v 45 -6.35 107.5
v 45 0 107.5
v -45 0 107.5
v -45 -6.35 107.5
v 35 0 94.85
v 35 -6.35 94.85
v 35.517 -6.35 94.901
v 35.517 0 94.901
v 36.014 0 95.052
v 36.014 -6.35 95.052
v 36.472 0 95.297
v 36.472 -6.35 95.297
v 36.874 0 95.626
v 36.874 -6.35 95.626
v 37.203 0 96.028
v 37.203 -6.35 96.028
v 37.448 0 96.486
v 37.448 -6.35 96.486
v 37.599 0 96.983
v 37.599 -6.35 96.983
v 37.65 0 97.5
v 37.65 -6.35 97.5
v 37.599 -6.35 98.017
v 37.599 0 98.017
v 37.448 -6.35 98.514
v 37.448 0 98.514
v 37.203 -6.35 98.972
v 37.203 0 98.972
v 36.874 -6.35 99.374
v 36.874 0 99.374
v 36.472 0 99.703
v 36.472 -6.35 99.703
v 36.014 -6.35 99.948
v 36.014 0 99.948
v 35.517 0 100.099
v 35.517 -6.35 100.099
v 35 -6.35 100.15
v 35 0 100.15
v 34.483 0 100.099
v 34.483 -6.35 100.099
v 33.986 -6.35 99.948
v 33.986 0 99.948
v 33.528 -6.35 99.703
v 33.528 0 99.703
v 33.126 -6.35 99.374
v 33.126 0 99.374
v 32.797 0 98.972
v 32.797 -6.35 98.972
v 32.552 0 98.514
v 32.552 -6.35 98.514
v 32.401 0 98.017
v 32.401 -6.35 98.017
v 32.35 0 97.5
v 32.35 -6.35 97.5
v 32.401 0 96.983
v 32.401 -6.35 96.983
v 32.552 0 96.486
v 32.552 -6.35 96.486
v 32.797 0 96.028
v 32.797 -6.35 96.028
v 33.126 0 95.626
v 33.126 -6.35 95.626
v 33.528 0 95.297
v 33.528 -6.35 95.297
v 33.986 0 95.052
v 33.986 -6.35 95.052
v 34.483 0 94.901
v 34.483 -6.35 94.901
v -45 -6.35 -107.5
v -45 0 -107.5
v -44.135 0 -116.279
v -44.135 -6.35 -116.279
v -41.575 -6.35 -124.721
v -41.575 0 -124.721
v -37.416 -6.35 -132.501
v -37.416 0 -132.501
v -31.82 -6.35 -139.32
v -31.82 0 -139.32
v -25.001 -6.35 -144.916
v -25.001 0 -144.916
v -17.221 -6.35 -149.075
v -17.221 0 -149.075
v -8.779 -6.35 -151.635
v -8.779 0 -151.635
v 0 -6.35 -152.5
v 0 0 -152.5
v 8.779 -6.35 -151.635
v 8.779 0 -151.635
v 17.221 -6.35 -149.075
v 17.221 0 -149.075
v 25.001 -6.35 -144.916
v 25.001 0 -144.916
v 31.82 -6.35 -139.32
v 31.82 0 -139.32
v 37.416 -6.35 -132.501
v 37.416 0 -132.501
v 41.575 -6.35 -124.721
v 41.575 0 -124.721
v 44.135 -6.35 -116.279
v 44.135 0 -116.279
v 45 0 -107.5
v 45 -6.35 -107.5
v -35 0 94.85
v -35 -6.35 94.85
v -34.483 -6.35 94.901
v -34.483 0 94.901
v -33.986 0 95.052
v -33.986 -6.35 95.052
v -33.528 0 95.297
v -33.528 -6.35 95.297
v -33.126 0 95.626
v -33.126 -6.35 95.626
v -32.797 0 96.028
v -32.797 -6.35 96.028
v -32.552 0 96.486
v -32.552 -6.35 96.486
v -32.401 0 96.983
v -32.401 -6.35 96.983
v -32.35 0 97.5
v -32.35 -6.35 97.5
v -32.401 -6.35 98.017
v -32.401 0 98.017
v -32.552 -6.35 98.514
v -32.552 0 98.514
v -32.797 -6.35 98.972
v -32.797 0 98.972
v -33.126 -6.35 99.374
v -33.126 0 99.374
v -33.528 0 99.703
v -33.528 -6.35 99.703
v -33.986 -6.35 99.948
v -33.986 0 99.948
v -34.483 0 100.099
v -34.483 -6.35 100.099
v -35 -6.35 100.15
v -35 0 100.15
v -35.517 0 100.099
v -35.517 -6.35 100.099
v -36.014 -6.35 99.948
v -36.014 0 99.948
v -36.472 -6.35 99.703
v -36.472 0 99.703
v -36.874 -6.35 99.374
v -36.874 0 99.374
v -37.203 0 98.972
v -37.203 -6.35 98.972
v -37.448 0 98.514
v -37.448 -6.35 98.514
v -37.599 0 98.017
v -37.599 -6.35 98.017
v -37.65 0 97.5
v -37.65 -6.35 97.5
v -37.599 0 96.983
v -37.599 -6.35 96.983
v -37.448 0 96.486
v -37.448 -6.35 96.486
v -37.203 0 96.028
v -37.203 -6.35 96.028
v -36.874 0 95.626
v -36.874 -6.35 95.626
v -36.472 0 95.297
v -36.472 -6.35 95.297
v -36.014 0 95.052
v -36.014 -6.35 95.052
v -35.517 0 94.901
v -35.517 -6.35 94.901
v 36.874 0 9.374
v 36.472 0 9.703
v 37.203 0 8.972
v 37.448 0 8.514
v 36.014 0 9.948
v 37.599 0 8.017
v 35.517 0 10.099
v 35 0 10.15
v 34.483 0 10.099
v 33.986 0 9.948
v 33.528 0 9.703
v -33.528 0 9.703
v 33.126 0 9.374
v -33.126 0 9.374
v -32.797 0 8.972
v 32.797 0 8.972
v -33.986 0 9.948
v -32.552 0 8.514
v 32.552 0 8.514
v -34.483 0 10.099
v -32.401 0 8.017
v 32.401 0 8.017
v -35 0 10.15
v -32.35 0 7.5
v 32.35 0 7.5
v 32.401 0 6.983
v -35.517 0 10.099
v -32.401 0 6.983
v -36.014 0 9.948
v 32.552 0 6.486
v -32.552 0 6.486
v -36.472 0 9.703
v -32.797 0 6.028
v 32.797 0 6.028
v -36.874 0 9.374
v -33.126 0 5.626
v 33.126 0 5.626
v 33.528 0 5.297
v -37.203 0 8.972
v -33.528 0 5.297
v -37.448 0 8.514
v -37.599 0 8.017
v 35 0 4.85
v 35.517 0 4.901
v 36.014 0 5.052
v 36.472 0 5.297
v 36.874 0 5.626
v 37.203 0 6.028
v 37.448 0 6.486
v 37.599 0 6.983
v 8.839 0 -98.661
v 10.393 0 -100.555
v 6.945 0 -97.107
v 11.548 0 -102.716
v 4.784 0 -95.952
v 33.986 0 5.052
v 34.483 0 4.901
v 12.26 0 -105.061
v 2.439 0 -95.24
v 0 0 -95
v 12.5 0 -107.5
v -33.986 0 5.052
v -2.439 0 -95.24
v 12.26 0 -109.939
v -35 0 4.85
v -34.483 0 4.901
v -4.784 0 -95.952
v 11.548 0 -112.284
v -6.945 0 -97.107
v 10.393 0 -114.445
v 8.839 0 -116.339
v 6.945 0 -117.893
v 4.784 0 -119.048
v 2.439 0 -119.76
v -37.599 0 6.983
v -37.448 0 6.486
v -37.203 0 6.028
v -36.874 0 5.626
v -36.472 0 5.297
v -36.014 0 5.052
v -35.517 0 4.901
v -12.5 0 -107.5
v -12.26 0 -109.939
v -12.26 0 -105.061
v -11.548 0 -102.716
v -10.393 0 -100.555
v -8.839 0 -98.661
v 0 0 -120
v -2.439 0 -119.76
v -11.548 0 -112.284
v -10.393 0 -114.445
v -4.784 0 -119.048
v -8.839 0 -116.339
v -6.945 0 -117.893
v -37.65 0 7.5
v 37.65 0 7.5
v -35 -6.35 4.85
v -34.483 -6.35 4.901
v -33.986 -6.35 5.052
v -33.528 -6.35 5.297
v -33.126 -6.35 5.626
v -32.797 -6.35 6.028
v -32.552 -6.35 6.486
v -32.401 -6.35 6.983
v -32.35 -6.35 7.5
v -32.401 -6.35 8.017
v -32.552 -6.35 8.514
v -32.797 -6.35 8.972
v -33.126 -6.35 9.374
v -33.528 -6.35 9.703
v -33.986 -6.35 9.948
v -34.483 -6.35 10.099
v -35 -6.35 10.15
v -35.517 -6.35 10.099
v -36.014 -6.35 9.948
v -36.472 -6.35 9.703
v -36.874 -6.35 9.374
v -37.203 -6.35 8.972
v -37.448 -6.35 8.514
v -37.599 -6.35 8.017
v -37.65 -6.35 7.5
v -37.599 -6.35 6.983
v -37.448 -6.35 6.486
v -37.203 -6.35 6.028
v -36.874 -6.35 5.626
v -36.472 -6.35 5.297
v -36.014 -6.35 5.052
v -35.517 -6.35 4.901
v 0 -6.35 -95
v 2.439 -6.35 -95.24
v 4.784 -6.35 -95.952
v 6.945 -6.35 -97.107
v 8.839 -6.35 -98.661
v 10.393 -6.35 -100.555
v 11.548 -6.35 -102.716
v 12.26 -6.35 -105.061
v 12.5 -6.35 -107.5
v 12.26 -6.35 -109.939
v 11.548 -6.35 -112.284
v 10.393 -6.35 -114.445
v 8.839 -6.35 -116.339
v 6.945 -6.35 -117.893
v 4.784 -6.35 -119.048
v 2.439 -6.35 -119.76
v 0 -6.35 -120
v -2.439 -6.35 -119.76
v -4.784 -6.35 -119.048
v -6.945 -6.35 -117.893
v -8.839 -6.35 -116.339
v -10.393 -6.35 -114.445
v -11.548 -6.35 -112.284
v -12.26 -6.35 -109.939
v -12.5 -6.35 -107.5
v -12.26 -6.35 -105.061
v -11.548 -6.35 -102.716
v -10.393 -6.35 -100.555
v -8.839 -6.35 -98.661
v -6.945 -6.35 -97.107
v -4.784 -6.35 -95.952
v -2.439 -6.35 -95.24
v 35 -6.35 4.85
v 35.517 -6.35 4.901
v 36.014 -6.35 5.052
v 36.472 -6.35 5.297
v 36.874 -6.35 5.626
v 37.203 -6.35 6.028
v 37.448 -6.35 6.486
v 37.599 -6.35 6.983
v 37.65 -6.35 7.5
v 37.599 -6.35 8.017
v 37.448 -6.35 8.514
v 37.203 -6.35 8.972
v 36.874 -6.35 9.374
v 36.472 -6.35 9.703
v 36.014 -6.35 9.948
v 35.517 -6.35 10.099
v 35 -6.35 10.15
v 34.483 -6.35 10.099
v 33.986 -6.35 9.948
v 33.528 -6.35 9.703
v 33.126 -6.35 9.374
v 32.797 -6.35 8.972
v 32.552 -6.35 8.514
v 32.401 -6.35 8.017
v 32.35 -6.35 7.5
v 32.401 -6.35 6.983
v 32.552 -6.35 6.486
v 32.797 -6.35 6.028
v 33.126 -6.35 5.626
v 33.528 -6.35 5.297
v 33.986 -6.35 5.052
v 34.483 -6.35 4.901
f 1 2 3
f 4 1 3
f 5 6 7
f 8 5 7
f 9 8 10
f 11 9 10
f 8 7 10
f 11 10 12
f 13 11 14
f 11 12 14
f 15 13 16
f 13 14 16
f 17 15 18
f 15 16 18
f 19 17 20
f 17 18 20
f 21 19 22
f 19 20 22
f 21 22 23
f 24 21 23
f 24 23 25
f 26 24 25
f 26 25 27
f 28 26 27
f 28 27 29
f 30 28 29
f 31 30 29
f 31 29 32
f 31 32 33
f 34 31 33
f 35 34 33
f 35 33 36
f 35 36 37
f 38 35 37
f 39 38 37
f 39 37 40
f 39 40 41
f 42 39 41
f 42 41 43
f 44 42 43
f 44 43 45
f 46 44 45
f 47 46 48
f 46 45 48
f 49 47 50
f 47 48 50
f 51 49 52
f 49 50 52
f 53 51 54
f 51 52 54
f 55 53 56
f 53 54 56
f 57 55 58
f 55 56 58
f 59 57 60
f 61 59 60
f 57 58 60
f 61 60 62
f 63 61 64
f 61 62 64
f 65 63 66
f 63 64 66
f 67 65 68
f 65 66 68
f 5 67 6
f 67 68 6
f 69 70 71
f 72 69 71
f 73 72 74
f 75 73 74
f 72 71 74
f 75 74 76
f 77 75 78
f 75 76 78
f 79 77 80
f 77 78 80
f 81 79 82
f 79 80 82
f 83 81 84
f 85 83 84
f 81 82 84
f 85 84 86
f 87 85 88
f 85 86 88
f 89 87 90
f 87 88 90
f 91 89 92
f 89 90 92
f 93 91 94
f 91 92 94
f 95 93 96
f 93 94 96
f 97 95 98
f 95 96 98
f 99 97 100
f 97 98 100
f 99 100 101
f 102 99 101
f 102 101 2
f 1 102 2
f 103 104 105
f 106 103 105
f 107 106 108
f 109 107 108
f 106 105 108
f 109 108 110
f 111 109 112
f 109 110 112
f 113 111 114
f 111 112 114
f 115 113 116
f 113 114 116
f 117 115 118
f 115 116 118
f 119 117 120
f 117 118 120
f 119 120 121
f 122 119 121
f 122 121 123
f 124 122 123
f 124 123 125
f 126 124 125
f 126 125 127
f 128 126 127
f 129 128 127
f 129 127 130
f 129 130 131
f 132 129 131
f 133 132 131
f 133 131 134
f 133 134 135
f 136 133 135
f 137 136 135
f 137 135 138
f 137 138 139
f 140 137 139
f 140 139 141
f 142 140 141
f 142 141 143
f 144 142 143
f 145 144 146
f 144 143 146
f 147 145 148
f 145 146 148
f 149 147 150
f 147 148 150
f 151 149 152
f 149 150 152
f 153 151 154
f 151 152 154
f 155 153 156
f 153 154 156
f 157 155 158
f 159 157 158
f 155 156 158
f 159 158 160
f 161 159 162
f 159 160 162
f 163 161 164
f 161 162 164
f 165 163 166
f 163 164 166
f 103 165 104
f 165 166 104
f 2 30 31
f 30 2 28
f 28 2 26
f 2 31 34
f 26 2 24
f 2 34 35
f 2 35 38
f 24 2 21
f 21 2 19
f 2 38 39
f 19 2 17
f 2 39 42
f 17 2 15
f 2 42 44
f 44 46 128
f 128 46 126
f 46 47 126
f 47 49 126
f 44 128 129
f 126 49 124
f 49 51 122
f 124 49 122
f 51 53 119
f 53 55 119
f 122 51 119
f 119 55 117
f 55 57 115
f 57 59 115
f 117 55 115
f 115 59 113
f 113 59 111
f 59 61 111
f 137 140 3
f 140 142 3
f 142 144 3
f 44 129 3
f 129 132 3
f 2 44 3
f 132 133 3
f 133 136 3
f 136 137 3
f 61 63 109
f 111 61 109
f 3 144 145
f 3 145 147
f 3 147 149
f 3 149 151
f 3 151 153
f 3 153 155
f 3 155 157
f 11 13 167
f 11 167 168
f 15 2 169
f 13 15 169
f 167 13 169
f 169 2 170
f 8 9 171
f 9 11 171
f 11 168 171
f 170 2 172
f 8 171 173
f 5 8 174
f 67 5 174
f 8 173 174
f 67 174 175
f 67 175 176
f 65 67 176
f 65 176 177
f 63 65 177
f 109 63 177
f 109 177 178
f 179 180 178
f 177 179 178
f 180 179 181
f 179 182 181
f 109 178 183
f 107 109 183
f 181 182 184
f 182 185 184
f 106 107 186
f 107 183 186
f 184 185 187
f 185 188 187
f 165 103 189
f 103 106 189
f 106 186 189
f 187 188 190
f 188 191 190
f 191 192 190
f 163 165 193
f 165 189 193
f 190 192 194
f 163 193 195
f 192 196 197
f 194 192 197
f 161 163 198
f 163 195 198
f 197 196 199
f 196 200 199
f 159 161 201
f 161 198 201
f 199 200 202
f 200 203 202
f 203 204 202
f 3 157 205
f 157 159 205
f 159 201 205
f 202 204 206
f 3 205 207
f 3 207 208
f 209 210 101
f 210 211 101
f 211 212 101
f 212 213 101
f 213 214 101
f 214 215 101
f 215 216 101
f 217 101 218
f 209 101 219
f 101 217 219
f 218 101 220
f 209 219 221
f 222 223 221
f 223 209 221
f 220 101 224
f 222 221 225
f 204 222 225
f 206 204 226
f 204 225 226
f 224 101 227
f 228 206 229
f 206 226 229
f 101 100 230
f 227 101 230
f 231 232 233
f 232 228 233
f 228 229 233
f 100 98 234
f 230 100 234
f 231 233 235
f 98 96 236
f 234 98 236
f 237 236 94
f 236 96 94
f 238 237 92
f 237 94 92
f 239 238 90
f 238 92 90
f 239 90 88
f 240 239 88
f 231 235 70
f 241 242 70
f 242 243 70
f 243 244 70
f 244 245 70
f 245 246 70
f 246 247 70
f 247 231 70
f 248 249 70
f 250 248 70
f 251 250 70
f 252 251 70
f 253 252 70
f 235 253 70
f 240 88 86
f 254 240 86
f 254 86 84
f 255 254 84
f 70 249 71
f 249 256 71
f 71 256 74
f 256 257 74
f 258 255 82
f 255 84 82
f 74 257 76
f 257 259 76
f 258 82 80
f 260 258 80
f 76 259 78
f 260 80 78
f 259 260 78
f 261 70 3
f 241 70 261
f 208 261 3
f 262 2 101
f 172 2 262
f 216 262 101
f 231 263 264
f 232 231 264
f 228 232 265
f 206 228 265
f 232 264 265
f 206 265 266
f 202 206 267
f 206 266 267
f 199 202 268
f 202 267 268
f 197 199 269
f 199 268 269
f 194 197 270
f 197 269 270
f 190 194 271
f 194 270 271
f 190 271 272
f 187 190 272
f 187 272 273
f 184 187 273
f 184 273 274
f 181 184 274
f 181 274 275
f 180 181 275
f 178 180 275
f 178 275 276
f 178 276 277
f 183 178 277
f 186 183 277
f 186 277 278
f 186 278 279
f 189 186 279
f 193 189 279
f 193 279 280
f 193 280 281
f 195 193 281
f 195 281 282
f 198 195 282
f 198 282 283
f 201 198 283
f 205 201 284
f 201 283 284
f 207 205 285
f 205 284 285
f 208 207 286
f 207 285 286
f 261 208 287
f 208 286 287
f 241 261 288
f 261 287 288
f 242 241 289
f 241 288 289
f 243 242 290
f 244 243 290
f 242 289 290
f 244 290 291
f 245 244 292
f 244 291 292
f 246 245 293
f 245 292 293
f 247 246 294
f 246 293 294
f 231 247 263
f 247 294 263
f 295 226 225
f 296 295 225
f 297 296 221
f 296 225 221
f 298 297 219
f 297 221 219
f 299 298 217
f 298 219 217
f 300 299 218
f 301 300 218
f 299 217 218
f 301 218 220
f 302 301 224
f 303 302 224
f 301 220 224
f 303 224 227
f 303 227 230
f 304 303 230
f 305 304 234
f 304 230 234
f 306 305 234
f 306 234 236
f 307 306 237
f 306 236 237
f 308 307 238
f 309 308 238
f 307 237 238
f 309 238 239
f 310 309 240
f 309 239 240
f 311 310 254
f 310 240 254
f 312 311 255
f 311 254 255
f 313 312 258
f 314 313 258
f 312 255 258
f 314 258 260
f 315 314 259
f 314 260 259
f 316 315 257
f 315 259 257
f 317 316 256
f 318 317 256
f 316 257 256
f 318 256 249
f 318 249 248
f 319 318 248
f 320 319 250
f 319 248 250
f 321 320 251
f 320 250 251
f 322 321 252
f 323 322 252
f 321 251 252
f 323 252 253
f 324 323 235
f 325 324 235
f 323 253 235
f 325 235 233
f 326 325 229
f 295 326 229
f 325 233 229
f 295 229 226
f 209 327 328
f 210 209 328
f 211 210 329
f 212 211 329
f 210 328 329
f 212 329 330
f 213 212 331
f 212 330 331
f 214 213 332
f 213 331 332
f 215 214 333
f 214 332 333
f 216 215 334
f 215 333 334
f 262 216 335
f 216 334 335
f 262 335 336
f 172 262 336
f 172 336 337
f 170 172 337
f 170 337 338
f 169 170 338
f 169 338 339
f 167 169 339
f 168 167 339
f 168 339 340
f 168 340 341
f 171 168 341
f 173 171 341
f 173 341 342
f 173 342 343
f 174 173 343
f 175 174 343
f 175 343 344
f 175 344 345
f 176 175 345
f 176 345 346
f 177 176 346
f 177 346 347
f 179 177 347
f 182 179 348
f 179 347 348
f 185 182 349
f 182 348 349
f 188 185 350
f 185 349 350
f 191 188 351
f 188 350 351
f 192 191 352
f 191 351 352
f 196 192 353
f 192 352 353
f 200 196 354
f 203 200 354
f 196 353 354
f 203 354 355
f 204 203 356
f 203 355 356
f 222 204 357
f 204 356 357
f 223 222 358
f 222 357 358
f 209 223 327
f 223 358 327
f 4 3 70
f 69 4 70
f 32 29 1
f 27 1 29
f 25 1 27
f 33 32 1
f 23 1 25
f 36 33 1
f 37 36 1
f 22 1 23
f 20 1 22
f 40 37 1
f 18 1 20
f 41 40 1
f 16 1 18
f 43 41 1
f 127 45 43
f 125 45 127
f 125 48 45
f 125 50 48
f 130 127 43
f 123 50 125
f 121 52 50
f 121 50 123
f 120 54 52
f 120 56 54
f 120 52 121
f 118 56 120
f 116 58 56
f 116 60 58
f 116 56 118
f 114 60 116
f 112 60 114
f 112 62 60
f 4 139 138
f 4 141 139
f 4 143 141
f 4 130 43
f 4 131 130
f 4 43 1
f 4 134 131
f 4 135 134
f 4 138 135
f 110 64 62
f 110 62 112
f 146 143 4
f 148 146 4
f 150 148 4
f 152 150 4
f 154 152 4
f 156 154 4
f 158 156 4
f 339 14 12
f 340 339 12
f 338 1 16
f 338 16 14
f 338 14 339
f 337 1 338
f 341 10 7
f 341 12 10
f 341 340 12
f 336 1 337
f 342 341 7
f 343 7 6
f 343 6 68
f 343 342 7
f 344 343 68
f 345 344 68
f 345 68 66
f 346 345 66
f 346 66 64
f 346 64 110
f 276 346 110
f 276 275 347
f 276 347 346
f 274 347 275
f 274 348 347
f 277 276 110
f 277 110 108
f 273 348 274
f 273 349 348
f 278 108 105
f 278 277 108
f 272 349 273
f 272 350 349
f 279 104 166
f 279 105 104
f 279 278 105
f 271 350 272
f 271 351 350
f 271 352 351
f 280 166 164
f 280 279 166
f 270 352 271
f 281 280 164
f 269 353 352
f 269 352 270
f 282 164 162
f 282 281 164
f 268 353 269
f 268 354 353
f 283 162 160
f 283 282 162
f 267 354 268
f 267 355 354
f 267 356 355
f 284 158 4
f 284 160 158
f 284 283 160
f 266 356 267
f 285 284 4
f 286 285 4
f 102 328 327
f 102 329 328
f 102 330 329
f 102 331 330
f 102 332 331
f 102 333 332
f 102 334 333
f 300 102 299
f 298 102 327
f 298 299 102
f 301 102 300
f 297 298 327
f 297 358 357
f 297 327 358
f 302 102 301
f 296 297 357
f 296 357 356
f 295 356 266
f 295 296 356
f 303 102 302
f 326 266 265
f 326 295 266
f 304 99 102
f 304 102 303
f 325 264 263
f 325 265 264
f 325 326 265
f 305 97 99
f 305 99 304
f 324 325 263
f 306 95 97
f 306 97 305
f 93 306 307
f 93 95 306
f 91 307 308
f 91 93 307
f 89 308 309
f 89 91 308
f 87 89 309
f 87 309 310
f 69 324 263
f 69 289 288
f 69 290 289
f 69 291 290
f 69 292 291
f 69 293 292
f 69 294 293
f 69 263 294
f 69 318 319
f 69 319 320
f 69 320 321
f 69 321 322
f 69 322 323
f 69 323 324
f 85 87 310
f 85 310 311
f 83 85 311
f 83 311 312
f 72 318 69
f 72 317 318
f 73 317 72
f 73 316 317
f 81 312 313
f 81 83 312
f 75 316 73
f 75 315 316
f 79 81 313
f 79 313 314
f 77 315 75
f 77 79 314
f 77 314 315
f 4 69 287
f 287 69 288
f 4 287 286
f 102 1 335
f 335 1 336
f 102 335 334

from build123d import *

# Parameters (mm, degrees)
SKETCH1_R            = 12.5
BOSS_EXTRUDE1_DEPTH  = 6.35
M5_CLEARANCE_HOLE1_D = 5.3


with BuildPart() as part:
    # Sketch1 → Boss-Extrude1 (new body)
    with BuildSketch(Plane(origin=(0, 0, 0), x_dir=(1, 0, 0), z_dir=(0, 1, 0))):
        with BuildLine():
            Line((-45, -107.5), (-45, 107.5))
            ThreePointArc((-45, 107.5), (0, 152.5), (45, 107.5))
            Line((45, 107.5), (45, -107.5))
            Line((45, -107.5), (-45, -107.5))
        make_face()
        with Locations(Location((0, 107.5, 0), (0, 0, 270))):
            Circle(SKETCH1_R, mode=Mode.SUBTRACT)
    extrude(amount=-BOSS_EXTRUDE1_DEPTH)

    # M5 Clearance Hole1 (through all)
    with Locations(Plane(origin=(-35, 0, 7.5), x_dir=(0, 0, 1), z_dir=(0, 1, 0))):
        with Locations((0, 0), (0, 70), (90, 0), (90, 70)):
            Hole(M5_CLEARANCE_HOLE1_D / 2)


solid = part.part
